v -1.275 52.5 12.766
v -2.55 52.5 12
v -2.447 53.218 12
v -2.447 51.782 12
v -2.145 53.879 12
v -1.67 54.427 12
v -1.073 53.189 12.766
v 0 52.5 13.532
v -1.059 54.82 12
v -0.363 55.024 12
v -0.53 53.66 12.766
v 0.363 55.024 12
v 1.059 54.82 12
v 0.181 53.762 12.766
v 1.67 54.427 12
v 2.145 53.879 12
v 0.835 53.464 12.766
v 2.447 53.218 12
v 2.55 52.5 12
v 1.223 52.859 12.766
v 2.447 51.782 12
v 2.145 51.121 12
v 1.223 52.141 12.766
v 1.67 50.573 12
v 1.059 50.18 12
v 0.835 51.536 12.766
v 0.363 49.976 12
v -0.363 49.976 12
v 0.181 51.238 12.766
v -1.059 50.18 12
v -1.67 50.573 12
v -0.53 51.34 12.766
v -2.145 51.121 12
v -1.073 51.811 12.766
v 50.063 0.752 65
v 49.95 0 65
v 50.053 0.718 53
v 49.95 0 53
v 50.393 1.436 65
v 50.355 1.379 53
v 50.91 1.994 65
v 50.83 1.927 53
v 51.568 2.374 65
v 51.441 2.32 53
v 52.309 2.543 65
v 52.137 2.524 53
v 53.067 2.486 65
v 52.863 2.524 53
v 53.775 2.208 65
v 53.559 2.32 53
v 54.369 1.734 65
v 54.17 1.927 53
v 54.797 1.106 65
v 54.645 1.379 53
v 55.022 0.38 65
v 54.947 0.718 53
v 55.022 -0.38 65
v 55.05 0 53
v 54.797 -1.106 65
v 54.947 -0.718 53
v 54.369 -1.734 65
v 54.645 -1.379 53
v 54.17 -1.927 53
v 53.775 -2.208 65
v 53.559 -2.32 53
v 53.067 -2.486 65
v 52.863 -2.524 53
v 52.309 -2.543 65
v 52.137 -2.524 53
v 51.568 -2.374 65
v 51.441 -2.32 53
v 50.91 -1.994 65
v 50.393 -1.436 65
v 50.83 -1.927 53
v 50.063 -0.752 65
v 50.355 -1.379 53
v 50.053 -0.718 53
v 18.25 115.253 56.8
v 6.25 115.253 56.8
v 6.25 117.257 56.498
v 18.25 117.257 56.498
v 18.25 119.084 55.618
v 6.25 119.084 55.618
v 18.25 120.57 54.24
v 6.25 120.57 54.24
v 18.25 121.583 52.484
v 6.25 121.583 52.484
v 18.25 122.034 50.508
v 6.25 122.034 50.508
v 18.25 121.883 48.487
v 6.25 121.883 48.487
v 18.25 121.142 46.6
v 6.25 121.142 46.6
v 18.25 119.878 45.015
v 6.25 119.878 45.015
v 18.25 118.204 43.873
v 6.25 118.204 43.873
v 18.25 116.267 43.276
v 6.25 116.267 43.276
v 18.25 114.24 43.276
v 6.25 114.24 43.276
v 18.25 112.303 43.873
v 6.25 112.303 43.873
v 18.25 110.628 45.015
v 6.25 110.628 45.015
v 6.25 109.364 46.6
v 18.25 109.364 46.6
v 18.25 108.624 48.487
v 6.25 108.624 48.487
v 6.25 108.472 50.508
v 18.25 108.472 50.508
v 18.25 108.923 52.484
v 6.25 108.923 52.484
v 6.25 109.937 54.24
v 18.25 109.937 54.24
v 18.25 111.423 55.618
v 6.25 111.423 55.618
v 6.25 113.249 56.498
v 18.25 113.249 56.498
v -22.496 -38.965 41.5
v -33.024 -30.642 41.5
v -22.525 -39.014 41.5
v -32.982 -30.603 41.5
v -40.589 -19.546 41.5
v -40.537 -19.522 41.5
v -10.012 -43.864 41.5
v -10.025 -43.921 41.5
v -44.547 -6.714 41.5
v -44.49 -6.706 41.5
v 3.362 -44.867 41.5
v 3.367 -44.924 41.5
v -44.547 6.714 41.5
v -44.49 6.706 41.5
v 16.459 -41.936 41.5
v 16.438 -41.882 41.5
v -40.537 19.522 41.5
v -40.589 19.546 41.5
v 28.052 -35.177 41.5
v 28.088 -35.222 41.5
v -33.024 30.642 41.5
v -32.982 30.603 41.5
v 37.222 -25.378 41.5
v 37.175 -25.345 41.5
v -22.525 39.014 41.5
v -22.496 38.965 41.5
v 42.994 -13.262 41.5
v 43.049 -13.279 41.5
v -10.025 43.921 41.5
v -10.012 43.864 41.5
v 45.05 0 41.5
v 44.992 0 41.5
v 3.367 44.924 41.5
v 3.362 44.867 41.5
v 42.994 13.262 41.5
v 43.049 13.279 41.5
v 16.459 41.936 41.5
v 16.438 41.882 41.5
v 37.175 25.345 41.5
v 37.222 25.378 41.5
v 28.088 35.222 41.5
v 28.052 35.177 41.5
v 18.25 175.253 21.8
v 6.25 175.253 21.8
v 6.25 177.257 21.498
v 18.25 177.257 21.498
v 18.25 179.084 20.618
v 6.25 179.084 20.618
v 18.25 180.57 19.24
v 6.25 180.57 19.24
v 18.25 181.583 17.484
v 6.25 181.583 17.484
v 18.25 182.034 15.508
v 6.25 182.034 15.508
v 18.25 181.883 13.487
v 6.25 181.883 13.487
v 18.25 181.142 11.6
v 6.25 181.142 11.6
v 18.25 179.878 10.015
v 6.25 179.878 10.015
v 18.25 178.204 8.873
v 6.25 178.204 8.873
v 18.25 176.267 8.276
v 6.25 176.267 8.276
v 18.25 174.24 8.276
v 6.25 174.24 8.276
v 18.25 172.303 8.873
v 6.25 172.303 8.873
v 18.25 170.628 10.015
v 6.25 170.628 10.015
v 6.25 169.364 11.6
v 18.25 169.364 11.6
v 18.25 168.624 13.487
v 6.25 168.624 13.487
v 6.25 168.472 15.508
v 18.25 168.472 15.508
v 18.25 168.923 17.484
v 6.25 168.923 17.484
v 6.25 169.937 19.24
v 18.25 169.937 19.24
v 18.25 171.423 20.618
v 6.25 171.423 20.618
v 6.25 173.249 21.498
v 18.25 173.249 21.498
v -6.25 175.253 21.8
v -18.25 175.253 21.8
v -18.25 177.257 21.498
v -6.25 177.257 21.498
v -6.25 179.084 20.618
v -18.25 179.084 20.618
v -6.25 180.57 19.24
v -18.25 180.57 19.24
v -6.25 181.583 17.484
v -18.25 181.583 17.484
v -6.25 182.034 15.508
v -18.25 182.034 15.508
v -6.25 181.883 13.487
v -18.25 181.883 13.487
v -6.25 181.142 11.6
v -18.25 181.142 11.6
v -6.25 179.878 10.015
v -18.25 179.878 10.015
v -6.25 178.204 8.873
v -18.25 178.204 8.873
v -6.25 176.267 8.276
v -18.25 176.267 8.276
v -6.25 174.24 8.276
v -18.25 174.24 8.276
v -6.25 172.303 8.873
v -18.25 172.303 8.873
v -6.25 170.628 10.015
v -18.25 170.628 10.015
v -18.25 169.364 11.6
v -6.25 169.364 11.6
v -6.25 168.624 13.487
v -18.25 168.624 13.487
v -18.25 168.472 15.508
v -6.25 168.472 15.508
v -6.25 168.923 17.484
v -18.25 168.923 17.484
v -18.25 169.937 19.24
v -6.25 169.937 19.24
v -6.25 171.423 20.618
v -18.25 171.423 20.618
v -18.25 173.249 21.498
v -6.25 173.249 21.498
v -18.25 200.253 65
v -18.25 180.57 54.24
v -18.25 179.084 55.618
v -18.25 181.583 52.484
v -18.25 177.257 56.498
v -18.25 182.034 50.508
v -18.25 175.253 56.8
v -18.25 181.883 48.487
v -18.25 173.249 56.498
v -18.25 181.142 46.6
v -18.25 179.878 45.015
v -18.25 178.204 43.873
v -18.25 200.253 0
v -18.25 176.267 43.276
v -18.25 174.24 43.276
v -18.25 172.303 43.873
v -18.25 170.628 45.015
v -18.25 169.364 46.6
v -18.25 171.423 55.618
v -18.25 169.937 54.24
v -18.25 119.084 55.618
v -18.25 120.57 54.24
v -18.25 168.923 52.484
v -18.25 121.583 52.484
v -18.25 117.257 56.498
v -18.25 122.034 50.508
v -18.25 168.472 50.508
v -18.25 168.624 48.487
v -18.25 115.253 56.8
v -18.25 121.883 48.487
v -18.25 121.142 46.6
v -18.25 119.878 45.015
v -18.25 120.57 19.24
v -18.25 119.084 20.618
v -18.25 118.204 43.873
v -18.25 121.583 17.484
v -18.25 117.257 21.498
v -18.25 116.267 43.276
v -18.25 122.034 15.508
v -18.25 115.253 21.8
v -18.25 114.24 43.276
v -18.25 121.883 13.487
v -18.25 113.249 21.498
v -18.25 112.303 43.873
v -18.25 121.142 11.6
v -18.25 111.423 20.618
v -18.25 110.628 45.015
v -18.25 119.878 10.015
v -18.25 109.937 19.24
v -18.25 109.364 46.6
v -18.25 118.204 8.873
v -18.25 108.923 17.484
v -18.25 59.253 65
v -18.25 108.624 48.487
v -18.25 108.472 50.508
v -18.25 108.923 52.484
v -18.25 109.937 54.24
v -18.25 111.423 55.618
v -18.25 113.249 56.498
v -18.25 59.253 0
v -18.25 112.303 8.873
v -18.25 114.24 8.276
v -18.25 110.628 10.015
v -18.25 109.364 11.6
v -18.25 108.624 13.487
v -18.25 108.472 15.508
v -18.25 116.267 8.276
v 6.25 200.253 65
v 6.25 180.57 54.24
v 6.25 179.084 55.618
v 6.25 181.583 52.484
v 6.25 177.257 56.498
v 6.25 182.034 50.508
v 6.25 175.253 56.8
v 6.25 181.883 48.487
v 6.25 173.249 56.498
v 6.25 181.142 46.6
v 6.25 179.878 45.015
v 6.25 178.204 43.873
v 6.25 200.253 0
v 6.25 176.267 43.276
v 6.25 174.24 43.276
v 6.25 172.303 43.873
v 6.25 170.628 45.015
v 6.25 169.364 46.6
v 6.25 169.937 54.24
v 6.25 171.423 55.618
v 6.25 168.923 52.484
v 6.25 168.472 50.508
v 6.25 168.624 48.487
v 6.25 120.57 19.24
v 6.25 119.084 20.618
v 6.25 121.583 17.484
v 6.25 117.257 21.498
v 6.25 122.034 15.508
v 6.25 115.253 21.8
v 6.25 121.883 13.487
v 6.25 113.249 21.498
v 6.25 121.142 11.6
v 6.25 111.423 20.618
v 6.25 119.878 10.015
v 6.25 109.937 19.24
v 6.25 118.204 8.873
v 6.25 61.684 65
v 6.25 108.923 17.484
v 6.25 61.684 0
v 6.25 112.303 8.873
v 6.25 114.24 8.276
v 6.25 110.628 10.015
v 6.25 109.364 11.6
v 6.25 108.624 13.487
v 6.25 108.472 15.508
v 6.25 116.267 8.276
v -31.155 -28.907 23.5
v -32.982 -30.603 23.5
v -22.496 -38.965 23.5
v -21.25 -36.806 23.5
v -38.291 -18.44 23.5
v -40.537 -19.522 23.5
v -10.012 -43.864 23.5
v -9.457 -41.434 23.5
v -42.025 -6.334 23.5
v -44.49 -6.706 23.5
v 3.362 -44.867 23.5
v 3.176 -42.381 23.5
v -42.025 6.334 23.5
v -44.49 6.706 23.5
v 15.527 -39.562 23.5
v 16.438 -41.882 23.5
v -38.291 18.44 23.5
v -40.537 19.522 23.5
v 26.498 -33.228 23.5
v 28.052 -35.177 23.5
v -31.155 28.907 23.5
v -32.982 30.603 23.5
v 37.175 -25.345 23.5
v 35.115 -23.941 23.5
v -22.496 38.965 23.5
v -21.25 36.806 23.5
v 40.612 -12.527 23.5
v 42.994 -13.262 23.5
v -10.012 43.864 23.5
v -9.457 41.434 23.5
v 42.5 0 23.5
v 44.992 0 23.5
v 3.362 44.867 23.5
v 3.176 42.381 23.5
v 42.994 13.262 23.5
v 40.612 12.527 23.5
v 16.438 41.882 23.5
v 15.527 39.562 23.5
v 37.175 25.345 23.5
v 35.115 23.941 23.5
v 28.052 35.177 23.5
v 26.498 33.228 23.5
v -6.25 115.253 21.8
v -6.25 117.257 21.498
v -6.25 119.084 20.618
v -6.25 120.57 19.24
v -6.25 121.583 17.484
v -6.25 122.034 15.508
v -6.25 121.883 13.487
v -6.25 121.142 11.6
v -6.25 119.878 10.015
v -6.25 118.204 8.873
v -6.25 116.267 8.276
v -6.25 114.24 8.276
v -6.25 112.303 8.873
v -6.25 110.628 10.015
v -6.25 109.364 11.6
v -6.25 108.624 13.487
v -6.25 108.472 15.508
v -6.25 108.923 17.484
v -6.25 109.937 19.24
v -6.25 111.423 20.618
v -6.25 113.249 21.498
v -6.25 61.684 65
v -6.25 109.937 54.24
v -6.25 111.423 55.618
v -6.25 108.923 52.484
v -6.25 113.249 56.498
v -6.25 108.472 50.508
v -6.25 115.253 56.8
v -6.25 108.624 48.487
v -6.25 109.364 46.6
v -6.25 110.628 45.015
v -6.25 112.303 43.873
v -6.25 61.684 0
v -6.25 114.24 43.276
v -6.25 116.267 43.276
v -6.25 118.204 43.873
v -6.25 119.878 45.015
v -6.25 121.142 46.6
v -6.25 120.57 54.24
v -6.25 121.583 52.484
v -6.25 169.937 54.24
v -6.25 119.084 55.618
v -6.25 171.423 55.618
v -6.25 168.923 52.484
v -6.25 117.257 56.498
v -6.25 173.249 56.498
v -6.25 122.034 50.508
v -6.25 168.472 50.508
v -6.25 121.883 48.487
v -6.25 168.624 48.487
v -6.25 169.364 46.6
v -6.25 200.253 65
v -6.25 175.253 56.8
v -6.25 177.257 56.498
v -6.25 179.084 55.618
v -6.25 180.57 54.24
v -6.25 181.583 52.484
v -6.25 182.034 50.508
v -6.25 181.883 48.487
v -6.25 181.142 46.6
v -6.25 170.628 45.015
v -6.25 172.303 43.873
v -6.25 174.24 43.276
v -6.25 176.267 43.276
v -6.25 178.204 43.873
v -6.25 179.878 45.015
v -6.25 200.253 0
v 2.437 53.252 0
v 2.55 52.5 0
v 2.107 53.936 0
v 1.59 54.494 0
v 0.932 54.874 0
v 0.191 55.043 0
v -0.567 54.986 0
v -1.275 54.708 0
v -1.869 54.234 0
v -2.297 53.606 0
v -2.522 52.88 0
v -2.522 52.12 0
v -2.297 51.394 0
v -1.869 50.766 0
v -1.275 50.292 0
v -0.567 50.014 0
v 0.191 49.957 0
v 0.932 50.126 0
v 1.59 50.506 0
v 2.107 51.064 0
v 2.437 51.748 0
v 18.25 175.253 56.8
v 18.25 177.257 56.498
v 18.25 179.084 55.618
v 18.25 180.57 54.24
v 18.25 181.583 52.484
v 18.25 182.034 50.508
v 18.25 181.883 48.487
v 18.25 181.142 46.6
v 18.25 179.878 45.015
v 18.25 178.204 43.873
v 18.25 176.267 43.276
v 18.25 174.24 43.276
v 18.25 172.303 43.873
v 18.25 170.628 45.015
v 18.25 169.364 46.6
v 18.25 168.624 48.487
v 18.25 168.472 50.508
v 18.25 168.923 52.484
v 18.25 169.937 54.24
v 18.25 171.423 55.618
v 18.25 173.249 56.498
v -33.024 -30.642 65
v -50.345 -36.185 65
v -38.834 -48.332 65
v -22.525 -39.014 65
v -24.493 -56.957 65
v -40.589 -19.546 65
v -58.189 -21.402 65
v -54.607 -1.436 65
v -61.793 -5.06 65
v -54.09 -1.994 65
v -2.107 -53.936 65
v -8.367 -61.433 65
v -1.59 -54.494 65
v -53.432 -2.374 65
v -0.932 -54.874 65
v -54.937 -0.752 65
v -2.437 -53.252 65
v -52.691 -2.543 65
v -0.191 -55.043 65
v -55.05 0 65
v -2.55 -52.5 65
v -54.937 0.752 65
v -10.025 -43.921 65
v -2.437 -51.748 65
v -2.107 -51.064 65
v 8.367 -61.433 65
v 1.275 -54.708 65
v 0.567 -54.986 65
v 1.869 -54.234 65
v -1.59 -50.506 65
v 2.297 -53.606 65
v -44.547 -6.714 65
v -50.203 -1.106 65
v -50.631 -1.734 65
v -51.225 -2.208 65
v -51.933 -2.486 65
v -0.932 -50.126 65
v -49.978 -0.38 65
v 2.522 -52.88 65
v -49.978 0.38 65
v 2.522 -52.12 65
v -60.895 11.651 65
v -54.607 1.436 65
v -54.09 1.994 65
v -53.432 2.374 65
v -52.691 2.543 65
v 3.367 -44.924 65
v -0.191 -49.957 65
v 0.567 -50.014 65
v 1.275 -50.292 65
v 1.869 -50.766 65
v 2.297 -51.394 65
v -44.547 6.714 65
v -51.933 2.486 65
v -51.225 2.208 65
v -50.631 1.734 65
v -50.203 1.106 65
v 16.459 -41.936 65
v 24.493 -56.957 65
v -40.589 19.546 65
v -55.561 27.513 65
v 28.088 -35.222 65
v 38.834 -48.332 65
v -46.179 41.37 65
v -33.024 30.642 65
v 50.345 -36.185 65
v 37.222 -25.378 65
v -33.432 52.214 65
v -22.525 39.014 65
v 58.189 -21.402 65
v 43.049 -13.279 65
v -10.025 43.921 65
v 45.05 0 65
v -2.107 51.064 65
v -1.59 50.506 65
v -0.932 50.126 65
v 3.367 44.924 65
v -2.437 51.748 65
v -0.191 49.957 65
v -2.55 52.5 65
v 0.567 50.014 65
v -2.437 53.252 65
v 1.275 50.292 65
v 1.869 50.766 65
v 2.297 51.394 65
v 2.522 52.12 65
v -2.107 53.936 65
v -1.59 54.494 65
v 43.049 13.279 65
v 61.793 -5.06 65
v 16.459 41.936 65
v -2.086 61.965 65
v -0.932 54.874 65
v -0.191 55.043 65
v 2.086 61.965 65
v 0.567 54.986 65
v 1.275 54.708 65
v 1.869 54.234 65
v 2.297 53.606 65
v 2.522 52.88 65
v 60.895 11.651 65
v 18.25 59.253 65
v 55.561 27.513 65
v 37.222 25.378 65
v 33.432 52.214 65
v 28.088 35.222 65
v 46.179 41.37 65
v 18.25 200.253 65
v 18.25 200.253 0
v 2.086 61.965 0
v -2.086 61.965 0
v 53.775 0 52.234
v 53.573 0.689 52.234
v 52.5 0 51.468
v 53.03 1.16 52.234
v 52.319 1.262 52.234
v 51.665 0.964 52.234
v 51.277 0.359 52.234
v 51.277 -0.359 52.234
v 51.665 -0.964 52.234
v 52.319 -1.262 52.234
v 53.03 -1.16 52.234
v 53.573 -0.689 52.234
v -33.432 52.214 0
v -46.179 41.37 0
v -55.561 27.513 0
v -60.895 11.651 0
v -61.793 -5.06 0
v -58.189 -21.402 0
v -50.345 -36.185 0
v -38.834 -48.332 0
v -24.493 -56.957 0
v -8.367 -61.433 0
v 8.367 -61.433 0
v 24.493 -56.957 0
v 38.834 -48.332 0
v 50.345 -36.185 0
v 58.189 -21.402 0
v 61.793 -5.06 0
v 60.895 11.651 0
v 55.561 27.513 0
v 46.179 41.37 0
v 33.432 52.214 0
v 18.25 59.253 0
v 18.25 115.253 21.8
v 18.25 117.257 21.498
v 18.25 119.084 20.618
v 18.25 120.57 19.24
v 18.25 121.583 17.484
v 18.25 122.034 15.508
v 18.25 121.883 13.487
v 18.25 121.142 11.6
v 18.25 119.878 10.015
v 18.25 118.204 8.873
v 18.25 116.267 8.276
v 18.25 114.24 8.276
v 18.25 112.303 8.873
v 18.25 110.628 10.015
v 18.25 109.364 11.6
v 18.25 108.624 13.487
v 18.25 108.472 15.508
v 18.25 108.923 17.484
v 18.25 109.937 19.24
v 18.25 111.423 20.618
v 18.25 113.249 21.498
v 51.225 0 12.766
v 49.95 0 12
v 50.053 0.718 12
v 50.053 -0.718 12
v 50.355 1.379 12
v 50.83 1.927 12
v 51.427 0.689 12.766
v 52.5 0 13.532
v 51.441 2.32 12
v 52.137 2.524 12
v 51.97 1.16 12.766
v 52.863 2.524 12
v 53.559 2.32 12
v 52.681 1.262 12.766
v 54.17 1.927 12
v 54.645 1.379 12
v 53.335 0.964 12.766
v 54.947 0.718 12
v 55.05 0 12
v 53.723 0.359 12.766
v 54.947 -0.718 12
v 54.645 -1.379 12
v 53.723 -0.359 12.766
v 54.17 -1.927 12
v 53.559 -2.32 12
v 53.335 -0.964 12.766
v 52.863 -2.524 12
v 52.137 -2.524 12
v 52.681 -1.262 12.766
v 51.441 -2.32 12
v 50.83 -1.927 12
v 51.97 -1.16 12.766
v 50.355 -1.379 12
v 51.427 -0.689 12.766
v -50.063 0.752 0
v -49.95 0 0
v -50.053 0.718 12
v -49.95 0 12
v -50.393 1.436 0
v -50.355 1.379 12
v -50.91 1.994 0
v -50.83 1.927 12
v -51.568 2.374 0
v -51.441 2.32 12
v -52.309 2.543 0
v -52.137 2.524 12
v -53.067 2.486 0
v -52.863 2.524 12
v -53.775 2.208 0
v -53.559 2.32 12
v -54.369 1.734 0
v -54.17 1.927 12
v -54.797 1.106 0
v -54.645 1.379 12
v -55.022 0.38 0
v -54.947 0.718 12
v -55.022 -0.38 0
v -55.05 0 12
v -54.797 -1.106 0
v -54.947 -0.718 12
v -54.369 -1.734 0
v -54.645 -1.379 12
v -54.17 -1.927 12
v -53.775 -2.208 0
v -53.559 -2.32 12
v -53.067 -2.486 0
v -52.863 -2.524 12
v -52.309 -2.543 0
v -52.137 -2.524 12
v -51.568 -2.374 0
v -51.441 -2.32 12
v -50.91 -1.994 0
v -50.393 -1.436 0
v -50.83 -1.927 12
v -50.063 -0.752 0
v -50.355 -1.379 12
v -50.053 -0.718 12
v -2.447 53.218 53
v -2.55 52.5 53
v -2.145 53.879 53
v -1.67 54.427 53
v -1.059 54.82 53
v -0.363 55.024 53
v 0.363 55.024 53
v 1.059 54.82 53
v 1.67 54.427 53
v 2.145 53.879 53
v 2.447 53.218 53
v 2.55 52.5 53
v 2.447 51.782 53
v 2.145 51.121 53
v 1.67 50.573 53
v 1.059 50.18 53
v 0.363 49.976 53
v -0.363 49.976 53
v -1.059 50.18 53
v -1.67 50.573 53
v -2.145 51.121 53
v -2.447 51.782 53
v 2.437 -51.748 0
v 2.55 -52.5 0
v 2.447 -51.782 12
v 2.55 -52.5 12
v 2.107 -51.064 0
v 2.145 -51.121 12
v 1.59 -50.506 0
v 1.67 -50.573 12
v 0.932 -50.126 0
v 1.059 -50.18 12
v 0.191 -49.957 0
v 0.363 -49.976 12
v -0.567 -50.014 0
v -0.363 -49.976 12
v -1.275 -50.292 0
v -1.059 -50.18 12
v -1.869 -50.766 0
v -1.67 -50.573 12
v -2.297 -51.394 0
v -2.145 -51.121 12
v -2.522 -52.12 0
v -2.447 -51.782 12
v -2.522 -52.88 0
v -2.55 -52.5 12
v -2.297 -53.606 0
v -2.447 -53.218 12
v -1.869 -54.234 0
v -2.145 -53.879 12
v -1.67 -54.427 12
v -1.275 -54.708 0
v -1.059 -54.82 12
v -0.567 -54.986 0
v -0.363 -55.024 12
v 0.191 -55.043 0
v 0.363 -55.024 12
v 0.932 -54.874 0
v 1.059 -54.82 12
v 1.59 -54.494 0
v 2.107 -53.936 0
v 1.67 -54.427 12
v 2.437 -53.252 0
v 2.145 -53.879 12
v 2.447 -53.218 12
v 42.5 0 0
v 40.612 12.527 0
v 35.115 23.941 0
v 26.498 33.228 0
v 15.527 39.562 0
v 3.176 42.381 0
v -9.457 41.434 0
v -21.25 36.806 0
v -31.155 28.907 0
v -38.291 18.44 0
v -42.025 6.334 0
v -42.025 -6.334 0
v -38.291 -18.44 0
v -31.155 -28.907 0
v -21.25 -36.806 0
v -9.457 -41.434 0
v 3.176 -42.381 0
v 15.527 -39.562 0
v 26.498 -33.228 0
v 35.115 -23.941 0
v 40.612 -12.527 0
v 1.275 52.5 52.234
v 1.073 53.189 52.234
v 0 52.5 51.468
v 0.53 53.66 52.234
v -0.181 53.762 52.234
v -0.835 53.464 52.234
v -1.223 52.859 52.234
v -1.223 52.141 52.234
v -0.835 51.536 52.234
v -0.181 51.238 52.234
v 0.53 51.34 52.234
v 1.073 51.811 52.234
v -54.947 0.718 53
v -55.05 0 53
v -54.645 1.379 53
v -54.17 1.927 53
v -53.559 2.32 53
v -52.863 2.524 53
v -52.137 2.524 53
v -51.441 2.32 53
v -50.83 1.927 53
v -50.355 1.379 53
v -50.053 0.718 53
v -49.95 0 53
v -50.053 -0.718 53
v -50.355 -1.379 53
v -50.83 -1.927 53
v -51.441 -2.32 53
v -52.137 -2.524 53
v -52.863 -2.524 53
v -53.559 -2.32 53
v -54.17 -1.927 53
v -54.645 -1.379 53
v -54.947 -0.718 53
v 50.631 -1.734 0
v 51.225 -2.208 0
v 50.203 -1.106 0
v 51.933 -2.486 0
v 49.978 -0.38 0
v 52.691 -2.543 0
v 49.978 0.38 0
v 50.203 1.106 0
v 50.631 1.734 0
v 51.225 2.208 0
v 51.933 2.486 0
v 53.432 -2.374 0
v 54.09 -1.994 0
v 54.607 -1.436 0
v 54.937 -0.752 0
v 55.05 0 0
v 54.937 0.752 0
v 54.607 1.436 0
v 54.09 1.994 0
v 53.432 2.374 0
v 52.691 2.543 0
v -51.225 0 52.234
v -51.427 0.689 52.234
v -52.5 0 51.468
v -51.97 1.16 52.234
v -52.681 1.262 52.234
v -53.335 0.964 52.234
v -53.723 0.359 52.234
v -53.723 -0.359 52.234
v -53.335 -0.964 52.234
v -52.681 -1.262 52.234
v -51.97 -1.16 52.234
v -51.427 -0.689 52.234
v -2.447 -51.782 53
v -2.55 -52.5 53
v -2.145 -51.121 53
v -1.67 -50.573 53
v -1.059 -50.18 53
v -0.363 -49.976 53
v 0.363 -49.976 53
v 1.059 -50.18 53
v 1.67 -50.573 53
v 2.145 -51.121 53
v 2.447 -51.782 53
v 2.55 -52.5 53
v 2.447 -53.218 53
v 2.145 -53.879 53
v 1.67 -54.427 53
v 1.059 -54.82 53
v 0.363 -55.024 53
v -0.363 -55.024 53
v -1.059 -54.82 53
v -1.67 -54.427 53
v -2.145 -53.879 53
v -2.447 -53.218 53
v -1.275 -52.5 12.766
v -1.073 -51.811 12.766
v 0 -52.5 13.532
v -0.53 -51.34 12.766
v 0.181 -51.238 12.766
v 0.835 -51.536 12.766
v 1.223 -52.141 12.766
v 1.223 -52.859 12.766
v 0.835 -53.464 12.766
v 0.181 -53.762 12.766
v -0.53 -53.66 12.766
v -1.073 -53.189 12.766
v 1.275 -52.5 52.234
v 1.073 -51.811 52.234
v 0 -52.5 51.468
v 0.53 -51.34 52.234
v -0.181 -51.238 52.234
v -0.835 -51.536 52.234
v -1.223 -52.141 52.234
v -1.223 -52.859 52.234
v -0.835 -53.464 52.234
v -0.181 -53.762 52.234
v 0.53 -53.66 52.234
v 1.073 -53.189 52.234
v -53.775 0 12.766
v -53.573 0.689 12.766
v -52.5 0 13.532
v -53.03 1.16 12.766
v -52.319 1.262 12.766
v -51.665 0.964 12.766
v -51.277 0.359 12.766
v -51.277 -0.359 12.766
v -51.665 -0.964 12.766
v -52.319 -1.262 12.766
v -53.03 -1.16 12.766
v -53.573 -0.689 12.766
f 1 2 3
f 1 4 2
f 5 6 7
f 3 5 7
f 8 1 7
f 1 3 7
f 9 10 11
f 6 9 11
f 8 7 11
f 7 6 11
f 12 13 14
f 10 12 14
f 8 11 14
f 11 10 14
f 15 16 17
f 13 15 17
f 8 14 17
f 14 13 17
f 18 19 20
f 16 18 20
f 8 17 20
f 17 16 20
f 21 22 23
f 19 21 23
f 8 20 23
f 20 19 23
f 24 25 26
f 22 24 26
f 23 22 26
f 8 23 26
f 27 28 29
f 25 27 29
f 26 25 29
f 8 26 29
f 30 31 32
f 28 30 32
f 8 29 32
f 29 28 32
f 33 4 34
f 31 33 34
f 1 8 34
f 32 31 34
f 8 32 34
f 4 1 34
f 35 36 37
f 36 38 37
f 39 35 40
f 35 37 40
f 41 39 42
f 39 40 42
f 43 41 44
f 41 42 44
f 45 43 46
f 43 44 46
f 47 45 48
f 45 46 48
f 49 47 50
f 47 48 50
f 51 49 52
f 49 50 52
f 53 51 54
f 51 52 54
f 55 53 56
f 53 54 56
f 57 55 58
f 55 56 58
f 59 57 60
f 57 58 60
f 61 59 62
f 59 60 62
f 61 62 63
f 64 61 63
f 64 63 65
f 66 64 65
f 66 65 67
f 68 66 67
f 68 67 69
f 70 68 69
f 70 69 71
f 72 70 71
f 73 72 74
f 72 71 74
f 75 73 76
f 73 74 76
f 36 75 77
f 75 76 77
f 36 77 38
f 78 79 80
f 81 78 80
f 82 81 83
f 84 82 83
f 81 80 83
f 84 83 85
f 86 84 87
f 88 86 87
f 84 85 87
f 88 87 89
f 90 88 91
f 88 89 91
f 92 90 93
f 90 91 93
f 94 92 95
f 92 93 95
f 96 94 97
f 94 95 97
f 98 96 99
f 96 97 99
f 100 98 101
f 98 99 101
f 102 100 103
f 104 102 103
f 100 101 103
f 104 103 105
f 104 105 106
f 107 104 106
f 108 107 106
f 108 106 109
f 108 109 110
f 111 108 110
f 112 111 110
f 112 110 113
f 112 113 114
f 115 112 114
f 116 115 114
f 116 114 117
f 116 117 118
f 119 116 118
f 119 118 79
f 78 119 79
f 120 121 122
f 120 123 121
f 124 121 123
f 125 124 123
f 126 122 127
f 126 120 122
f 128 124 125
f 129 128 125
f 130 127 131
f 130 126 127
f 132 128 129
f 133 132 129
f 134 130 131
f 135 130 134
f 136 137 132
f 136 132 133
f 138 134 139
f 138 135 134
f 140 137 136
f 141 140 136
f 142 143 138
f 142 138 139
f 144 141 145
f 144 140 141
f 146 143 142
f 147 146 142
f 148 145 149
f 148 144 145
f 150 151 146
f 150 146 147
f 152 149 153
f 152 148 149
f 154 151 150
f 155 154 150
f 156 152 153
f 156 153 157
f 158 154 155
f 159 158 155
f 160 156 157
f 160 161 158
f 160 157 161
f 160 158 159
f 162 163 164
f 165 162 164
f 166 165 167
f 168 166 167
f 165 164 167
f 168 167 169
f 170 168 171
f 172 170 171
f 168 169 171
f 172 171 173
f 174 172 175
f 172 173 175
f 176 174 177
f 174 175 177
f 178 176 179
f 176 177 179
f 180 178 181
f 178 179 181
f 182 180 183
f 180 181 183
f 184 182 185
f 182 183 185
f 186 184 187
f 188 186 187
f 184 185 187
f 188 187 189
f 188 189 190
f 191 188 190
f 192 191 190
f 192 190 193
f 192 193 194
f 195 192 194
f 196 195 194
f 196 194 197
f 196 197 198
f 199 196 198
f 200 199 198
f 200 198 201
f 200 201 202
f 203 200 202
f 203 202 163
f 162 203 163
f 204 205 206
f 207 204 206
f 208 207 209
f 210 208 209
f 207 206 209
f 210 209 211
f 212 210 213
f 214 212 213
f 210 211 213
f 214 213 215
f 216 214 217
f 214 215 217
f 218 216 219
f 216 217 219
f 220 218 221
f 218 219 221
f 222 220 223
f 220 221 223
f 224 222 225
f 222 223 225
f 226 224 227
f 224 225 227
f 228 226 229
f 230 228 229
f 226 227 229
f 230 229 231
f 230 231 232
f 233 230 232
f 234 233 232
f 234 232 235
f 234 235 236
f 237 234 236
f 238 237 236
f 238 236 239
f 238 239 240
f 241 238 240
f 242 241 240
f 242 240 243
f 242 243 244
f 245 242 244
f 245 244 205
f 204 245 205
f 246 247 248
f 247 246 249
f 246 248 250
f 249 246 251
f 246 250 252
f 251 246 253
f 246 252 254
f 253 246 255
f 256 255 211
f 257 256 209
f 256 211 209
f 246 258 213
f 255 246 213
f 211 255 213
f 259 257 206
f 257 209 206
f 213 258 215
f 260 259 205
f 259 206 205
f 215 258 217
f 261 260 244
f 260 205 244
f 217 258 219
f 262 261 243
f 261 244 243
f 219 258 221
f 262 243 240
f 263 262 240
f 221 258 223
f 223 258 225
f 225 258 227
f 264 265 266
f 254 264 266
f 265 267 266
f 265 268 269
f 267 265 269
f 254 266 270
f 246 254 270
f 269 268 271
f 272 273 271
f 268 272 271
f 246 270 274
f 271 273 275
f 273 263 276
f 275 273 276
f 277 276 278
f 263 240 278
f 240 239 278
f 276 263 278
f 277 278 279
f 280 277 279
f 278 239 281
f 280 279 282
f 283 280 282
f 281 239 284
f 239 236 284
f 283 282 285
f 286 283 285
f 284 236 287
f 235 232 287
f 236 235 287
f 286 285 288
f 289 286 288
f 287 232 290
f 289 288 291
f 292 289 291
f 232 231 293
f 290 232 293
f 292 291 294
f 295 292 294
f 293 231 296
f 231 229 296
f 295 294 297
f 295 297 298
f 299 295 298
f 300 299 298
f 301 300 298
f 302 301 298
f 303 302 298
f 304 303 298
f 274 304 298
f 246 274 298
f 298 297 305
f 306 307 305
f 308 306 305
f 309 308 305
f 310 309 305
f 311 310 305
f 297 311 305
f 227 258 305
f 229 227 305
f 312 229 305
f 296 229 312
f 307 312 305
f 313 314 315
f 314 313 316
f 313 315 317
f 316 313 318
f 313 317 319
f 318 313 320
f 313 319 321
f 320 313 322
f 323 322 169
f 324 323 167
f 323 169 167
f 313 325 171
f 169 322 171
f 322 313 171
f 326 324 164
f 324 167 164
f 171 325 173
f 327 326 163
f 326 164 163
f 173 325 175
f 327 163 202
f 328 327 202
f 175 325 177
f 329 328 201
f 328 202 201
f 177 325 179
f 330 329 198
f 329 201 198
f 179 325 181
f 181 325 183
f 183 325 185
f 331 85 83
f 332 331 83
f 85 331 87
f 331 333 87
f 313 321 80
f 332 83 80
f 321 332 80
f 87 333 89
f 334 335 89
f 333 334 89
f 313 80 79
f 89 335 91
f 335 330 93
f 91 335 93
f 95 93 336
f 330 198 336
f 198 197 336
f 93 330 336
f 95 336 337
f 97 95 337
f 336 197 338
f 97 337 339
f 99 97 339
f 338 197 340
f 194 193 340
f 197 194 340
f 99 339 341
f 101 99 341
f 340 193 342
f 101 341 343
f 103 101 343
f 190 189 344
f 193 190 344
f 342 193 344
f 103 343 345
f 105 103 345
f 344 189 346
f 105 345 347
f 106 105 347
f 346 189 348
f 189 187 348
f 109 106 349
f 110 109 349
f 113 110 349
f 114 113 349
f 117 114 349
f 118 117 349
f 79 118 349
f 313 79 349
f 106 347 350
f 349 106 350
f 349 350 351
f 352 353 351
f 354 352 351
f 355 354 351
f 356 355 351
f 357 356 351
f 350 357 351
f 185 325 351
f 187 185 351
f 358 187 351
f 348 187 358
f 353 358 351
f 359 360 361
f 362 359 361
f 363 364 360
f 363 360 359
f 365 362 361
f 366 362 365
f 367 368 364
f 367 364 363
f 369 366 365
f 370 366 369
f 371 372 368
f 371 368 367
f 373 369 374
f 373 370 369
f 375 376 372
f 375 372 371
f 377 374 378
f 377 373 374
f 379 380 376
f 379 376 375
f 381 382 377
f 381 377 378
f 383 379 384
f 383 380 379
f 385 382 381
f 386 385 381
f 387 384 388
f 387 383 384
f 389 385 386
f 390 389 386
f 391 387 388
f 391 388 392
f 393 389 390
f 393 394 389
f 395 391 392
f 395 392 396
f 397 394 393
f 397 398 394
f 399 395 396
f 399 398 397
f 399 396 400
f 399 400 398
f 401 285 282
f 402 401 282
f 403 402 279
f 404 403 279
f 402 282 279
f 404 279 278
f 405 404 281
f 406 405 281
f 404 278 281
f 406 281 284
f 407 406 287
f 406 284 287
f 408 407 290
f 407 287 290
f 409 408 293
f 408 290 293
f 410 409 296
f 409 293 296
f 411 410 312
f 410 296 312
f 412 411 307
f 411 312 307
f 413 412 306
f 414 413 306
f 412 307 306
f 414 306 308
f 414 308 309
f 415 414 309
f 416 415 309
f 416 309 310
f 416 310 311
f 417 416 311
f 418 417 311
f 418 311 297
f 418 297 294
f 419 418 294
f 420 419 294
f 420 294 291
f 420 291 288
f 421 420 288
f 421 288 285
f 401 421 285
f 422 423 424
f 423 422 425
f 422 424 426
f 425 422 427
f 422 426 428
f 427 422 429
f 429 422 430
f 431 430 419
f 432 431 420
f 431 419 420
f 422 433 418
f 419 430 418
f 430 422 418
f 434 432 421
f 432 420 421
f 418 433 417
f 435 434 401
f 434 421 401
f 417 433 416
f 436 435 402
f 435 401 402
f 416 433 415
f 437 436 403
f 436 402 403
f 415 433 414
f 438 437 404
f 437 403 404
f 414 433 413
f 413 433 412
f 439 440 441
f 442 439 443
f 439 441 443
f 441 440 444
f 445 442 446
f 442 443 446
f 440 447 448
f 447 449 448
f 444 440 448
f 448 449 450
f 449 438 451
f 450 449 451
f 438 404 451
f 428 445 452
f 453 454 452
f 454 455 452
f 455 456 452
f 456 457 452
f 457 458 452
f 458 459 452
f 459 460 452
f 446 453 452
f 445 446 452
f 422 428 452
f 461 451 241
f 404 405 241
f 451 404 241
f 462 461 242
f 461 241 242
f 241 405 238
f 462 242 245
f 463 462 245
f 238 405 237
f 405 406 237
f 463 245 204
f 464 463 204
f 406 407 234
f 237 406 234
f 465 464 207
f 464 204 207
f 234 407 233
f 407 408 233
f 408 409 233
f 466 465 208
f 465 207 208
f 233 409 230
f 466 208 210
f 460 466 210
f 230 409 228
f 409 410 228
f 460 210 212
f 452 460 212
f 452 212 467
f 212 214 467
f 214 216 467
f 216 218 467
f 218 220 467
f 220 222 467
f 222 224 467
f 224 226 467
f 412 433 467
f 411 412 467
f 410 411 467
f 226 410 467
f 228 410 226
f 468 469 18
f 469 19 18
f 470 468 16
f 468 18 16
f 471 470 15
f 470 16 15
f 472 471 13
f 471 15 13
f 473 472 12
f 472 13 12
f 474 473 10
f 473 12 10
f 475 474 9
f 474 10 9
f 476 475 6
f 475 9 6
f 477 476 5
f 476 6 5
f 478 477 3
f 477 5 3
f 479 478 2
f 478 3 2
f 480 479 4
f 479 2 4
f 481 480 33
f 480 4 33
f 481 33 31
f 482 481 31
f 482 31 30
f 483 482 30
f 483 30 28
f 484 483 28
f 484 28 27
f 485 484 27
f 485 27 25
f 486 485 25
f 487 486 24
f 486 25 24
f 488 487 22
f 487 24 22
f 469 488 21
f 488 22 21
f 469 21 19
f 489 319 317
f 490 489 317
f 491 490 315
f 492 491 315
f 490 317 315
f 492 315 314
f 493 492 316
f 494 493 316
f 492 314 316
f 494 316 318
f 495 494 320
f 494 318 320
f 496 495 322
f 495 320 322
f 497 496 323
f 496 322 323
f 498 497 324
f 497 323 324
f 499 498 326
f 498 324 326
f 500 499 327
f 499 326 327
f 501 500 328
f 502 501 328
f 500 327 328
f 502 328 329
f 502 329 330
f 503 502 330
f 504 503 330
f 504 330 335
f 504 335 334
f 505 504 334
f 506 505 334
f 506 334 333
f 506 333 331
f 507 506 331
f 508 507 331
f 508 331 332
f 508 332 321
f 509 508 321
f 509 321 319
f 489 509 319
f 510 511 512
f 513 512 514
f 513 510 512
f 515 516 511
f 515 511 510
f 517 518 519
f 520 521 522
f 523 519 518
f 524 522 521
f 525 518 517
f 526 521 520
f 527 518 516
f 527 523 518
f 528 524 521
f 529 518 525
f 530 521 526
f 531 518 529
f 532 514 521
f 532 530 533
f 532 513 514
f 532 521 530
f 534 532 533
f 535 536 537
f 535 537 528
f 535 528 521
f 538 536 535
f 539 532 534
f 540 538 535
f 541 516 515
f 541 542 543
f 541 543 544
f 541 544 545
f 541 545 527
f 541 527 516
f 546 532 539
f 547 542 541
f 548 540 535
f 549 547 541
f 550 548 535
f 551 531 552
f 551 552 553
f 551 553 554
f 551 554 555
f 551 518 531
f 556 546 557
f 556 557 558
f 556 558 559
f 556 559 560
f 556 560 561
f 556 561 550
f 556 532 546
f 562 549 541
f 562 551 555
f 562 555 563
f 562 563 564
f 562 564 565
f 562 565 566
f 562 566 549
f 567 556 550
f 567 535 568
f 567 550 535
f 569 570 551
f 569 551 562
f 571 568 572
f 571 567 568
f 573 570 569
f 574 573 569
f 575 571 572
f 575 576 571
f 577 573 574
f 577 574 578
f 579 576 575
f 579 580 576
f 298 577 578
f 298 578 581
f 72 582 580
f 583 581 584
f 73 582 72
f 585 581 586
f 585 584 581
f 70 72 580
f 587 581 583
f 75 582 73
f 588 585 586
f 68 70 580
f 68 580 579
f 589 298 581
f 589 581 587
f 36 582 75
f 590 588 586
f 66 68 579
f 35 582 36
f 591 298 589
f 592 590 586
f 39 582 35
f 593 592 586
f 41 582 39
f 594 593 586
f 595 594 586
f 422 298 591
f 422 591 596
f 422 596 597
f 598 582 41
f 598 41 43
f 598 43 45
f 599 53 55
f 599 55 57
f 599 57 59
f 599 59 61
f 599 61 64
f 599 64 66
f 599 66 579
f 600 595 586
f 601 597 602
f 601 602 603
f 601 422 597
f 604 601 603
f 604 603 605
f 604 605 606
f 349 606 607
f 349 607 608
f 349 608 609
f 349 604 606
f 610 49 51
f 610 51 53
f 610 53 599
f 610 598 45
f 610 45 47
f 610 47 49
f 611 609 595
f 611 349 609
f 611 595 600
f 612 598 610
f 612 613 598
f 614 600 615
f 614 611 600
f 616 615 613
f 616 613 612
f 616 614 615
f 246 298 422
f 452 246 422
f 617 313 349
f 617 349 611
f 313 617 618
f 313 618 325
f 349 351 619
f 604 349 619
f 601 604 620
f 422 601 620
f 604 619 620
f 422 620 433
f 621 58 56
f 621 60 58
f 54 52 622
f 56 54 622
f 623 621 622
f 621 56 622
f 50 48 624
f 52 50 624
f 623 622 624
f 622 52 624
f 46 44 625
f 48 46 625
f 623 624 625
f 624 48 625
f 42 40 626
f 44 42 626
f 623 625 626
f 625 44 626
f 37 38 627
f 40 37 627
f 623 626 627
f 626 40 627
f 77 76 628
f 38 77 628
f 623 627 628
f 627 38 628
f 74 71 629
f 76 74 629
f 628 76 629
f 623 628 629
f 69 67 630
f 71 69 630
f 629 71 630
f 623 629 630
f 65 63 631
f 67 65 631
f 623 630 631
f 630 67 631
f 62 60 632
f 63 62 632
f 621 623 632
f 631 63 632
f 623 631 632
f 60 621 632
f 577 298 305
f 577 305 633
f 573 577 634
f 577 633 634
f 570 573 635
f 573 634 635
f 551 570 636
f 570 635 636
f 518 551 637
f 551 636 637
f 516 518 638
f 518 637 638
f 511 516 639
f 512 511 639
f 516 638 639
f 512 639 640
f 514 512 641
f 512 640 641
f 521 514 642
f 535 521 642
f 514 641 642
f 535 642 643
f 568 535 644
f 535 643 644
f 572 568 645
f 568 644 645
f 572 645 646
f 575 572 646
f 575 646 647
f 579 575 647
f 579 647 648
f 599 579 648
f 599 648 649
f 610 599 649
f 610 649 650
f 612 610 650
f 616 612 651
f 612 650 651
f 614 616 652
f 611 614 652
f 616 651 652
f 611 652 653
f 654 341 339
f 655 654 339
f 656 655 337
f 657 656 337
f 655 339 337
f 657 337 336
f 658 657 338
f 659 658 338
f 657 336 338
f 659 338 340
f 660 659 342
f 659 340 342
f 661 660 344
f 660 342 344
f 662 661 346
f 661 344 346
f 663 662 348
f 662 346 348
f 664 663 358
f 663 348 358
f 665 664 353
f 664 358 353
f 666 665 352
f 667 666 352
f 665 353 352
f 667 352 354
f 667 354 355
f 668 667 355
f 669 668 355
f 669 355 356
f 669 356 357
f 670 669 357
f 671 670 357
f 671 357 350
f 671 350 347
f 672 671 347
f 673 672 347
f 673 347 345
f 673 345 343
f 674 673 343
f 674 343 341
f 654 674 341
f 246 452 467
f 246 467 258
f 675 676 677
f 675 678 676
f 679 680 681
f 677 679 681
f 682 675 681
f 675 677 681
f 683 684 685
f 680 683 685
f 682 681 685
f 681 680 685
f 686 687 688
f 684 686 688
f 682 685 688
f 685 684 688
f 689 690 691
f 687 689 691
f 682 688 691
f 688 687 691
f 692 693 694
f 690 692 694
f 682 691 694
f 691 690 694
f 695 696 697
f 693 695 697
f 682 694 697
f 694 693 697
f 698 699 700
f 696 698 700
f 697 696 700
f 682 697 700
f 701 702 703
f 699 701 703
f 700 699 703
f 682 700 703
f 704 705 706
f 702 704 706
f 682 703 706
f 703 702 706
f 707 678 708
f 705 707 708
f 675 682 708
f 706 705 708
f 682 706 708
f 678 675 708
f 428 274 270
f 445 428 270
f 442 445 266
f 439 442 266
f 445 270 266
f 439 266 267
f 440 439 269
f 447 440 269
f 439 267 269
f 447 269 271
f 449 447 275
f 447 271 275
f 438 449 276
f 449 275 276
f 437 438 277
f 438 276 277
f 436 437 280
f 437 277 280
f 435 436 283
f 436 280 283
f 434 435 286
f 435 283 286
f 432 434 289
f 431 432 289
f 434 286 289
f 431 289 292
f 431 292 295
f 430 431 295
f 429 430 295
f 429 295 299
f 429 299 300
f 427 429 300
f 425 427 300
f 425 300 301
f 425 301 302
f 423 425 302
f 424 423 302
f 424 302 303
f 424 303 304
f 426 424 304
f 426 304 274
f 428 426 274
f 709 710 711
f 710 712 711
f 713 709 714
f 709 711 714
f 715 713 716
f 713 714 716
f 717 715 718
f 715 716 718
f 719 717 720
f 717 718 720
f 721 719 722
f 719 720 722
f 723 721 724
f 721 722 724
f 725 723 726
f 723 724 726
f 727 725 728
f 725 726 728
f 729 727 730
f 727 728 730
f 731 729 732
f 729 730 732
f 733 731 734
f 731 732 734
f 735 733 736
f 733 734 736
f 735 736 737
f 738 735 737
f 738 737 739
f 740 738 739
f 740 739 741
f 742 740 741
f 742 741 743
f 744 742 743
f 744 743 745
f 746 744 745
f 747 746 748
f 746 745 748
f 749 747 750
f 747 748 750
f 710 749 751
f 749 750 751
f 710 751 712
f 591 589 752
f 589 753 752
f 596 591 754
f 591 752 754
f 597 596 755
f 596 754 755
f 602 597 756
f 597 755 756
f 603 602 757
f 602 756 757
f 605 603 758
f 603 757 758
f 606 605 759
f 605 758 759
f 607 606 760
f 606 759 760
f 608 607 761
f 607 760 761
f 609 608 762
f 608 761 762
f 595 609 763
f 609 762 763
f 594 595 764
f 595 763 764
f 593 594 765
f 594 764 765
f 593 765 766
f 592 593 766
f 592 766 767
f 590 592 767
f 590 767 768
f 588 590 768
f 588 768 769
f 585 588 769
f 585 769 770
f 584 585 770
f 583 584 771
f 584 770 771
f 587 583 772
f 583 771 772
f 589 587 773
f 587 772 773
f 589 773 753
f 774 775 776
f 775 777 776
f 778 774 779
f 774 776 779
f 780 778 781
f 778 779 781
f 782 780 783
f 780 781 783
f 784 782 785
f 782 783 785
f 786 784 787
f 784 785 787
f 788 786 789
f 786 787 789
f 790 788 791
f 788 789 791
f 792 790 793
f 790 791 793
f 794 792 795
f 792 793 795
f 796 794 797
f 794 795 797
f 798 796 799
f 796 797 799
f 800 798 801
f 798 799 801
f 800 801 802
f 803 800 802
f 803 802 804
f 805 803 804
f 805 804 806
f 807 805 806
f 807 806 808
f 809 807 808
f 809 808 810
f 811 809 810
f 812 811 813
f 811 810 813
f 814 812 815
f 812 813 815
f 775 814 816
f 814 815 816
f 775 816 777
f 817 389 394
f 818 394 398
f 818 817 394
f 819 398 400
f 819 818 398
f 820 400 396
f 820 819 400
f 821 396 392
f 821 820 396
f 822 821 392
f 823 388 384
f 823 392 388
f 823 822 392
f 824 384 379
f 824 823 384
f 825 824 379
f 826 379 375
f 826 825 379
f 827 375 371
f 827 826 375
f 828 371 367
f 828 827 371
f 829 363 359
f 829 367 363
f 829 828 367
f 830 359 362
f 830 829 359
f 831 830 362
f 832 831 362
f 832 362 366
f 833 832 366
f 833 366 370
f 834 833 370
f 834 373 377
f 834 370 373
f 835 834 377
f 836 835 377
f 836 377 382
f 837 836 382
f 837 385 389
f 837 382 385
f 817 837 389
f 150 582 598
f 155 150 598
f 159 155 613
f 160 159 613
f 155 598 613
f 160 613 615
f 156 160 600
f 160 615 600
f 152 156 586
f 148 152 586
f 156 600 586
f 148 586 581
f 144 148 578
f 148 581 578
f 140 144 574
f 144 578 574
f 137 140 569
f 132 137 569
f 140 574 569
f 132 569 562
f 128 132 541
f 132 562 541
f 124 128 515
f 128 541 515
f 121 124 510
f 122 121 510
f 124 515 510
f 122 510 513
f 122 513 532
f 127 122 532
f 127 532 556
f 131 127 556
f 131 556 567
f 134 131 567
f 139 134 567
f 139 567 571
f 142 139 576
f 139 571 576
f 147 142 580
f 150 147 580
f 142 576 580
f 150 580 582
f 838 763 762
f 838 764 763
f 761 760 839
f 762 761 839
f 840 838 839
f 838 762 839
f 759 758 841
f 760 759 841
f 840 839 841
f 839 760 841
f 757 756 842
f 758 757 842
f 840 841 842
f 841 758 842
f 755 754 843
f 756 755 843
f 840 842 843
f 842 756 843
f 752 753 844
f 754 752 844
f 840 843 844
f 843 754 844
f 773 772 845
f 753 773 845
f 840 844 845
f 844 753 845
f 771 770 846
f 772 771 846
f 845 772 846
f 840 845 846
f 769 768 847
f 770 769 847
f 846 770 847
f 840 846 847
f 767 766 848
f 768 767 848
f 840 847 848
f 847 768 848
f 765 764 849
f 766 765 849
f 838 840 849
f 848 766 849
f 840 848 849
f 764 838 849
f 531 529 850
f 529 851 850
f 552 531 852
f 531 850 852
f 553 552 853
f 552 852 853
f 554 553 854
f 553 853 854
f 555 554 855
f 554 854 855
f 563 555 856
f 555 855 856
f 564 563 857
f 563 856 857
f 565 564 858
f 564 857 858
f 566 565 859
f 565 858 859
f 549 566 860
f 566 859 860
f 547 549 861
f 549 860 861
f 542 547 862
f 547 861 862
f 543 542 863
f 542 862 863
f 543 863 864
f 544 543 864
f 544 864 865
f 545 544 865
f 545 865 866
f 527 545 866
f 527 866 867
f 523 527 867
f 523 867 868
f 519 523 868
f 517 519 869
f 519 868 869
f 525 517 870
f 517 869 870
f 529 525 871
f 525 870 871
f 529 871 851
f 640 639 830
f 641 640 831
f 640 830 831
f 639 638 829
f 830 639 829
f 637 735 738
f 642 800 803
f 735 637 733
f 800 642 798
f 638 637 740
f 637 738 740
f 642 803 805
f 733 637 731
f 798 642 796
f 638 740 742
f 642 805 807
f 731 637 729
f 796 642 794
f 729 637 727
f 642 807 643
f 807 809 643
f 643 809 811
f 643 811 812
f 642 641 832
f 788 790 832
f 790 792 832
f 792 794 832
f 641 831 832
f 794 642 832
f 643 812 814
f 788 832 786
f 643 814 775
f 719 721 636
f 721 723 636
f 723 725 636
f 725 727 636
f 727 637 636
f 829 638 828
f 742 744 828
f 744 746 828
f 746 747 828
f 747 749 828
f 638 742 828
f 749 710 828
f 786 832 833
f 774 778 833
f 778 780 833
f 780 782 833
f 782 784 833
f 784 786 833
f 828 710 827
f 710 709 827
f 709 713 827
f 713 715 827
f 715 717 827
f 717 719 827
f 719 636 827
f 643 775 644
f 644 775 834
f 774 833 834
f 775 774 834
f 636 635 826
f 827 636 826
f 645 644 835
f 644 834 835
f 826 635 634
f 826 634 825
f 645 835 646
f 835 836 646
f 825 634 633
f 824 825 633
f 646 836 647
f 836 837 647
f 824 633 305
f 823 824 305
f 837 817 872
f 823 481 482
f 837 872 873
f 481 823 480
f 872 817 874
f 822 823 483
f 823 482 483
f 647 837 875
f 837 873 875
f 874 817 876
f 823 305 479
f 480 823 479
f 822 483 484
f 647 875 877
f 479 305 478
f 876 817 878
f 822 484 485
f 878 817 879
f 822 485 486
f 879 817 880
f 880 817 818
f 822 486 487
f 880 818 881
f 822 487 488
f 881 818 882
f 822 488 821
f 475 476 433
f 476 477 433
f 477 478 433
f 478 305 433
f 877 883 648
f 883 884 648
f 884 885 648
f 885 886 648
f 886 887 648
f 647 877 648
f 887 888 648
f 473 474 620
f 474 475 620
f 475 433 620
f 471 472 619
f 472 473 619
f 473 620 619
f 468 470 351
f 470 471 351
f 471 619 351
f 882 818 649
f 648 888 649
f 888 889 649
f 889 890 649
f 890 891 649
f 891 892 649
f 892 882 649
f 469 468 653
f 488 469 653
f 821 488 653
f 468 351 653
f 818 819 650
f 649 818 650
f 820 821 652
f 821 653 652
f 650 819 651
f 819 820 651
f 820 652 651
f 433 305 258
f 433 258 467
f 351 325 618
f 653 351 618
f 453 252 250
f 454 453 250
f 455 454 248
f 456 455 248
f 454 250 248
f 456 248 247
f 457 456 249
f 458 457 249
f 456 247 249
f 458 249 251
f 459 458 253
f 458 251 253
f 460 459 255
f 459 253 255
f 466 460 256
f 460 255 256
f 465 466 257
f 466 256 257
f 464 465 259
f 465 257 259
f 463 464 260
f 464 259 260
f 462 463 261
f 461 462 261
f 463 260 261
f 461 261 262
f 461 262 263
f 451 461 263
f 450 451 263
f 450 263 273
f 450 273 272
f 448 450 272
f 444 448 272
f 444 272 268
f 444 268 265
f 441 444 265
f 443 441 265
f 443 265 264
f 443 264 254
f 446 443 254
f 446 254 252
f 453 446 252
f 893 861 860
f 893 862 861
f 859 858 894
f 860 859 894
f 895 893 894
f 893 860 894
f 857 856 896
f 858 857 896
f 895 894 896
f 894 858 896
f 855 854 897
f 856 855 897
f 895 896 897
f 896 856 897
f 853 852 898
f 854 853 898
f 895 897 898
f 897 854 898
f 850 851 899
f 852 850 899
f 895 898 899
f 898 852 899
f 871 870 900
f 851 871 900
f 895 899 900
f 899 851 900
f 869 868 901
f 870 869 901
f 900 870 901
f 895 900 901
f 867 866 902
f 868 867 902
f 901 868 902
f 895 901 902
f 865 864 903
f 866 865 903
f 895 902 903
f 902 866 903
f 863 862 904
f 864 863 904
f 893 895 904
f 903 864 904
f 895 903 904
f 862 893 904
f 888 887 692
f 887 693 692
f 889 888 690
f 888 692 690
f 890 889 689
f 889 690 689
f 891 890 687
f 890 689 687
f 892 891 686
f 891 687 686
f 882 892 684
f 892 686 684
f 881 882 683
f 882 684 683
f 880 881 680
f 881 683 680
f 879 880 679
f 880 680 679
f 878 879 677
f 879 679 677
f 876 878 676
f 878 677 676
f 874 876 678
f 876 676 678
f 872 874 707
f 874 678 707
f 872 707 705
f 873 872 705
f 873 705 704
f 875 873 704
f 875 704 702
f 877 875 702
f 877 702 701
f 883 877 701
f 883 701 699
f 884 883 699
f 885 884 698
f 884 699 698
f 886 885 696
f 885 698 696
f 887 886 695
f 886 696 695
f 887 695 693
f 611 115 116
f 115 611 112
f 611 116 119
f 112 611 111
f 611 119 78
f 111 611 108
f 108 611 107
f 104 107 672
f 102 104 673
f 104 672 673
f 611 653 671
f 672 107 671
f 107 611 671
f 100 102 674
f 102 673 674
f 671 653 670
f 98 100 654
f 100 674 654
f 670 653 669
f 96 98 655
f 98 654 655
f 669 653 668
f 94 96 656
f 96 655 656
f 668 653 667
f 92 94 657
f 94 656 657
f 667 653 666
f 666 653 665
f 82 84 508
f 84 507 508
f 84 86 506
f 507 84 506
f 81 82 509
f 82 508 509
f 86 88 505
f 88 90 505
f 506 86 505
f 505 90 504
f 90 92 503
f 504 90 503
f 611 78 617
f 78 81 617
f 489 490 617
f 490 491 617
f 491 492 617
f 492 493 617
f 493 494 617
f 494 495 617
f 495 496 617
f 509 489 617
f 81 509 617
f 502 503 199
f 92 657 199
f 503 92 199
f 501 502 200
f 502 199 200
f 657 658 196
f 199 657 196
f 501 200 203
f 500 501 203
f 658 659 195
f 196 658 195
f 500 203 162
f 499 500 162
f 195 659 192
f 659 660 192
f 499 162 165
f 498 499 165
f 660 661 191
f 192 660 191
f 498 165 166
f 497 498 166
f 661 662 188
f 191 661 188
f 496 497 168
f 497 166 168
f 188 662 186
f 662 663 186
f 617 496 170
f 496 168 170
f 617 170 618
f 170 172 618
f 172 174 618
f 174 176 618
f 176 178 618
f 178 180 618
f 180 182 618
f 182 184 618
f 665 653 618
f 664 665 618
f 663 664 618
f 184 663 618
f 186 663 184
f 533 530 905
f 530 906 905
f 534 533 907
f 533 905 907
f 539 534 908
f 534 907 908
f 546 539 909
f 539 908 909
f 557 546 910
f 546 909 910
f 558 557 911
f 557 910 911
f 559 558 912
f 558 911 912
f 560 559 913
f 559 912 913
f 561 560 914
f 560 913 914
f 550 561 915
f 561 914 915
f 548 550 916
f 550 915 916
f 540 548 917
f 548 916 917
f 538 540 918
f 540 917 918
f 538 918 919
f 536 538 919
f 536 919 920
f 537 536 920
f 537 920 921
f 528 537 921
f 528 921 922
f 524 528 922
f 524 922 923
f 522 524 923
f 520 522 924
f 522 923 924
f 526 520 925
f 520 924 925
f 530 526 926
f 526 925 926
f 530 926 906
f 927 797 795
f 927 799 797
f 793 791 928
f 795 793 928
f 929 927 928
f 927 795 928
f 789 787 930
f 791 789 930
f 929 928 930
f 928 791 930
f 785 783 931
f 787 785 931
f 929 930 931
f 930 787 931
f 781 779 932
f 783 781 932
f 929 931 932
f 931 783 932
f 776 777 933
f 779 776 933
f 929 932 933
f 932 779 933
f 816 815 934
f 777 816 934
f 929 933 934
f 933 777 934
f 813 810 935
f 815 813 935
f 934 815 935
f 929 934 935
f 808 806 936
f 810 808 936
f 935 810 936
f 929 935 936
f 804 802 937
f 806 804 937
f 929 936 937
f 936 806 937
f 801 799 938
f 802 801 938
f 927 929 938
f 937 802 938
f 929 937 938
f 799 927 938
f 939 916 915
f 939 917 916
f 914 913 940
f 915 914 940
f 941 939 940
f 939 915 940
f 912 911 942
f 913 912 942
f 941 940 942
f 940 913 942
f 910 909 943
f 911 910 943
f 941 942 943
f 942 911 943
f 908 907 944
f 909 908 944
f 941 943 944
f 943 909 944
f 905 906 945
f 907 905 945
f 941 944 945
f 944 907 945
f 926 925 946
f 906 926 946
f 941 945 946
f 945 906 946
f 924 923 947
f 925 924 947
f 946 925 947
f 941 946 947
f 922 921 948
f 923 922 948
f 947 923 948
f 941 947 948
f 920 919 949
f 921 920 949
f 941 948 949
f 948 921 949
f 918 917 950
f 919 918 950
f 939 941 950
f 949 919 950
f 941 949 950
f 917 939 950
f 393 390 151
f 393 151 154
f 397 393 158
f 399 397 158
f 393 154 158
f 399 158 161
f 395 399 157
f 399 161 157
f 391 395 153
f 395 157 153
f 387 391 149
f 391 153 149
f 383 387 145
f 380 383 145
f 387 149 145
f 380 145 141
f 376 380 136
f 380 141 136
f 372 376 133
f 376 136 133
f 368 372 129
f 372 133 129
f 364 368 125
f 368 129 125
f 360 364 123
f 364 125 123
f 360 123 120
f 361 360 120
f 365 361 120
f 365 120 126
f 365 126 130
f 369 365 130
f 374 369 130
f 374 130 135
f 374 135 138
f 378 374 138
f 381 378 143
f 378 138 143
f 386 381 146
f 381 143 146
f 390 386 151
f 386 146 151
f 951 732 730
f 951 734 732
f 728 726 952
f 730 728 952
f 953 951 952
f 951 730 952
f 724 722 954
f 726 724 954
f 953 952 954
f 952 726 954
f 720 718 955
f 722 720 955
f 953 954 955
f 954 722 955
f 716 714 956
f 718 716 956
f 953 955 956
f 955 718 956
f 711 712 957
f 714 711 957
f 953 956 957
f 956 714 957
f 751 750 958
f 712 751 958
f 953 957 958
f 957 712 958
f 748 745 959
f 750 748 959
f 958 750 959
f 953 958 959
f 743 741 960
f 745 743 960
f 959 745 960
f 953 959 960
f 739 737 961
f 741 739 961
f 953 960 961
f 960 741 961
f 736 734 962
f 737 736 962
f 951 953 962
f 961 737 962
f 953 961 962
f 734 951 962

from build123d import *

# Parameters (mm, degrees)
SKETCH1_R              = 42.5
BOSS_EXTRUDE1_DEPTH    = 65
SKETCH2_R              = 45.05
CUT_EXTRUDE1_DEPTH     = 23.5
SKETCH3_R              = 44.9925
CUT_EXTRUDE2_DEPTH     = 18
M6_TAPPED_HOLE1_D      = 5.1
M6_TAPPED_HOLE1_DEPTH  = 12
M6_TAPPED_HOLE1_TIP    = 1.532194579
M6_TAPPED_HOLE2_D      = 5.1
M6_TAPPED_HOLE2_DEPTH  = 12
M6_TAPPED_HOLE2_TIP    = 1.532194579
F_12_0MM_DOWEL_HOLE1_D = 13.6


with BuildPart() as part:
    # Sketch1 → Boss-Extrude1 (new body)
    with BuildSketch(Plane.XY):
        with BuildLine():
            Line((6.25, 200.253164472), (6.25, 61.684175442))
            ThreePointArc((6.25, 61.684175442), (0, 62), (-6.25, 61.684175442))
            Line((-6.25, 61.684175442), (-6.25, 200.253164472))
            Line((-6.25, 200.253164472), (-18.25, 200.253164472))
            Line((-18.25, 200.253164472), (-18.25, 59.253164472))
            ThreePointArc((-18.25, 59.253164472), (0, -62), (18.25, 59.253164472))
            Line((18.25, 59.253164472), (18.25, 200.253164472))
            Line((18.25, 200.253164472), (6.25, 200.253164472))
        make_face()
        Circle(SKETCH1_R, mode=Mode.SUBTRACT)
    extrude(amount=BOSS_EXTRUDE1_DEPTH)

    # Sketch2 → Cut-Extrude1 (cut)
    with BuildSketch(Plane.XY.offset(65)):
        Circle(SKETCH2_R)
    extrude(amount=-CUT_EXTRUDE1_DEPTH, mode=Mode.SUBTRACT)

    # Sketch3 → Cut-Extrude2 (cut)
    with BuildSketch(Plane.XY.offset(41.5)):
        Circle(SKETCH3_R)
    extrude(amount=-CUT_EXTRUDE2_DEPTH, mode=Mode.SUBTRACT)

    # M6 Tapped Hole1
    with Locations(Plane.XY.offset(65)):
        with Locations((0, -52.5), (-52.5, 0), (0, 52.5), (52.5, 0)):
            Hole(M6_TAPPED_HOLE1_D / 2, depth=M6_TAPPED_HOLE1_DEPTH)
            with Locations((0, 0, -(M6_TAPPED_HOLE1_DEPTH + M6_TAPPED_HOLE1_TIP / 2))):  # 118° drill point
                Cone(0, M6_TAPPED_HOLE1_D / 2, M6_TAPPED_HOLE1_TIP, mode=Mode.SUBTRACT)

    # M6 Tapped Hole2
    with Locations(Plane(origin=(0, 0, 0), x_dir=(-1, 0, 0), z_dir=(0, 0, -1))):
        with Locations((-52.5, 0), (0, 52.5), (52.5, 0), (0, -52.5)):
            Hole(M6_TAPPED_HOLE2_D / 2, depth=M6_TAPPED_HOLE2_DEPTH)
            with Locations((0, 0, -(M6_TAPPED_HOLE2_DEPTH + M6_TAPPED_HOLE2_TIP / 2))):  # 118° drill point
                Cone(0, M6_TAPPED_HOLE2_D / 2, M6_TAPPED_HOLE2_TIP, mode=Mode.SUBTRACT)

    # Ø12.0mm Dowel Hole1 (through all)
    with Locations(Plane(origin=(18.25, 0, 0), x_dir=(0, 0, -1), z_dir=(1, 0, 0))):
        with Locations((-50, 175.253164472), (-15, 175.253164472), (-15, 115.253164472), (-50, 115.253164472)):
            Hole(F_12_0MM_DOWEL_HOLE1_D / 2)


solid = part.part
